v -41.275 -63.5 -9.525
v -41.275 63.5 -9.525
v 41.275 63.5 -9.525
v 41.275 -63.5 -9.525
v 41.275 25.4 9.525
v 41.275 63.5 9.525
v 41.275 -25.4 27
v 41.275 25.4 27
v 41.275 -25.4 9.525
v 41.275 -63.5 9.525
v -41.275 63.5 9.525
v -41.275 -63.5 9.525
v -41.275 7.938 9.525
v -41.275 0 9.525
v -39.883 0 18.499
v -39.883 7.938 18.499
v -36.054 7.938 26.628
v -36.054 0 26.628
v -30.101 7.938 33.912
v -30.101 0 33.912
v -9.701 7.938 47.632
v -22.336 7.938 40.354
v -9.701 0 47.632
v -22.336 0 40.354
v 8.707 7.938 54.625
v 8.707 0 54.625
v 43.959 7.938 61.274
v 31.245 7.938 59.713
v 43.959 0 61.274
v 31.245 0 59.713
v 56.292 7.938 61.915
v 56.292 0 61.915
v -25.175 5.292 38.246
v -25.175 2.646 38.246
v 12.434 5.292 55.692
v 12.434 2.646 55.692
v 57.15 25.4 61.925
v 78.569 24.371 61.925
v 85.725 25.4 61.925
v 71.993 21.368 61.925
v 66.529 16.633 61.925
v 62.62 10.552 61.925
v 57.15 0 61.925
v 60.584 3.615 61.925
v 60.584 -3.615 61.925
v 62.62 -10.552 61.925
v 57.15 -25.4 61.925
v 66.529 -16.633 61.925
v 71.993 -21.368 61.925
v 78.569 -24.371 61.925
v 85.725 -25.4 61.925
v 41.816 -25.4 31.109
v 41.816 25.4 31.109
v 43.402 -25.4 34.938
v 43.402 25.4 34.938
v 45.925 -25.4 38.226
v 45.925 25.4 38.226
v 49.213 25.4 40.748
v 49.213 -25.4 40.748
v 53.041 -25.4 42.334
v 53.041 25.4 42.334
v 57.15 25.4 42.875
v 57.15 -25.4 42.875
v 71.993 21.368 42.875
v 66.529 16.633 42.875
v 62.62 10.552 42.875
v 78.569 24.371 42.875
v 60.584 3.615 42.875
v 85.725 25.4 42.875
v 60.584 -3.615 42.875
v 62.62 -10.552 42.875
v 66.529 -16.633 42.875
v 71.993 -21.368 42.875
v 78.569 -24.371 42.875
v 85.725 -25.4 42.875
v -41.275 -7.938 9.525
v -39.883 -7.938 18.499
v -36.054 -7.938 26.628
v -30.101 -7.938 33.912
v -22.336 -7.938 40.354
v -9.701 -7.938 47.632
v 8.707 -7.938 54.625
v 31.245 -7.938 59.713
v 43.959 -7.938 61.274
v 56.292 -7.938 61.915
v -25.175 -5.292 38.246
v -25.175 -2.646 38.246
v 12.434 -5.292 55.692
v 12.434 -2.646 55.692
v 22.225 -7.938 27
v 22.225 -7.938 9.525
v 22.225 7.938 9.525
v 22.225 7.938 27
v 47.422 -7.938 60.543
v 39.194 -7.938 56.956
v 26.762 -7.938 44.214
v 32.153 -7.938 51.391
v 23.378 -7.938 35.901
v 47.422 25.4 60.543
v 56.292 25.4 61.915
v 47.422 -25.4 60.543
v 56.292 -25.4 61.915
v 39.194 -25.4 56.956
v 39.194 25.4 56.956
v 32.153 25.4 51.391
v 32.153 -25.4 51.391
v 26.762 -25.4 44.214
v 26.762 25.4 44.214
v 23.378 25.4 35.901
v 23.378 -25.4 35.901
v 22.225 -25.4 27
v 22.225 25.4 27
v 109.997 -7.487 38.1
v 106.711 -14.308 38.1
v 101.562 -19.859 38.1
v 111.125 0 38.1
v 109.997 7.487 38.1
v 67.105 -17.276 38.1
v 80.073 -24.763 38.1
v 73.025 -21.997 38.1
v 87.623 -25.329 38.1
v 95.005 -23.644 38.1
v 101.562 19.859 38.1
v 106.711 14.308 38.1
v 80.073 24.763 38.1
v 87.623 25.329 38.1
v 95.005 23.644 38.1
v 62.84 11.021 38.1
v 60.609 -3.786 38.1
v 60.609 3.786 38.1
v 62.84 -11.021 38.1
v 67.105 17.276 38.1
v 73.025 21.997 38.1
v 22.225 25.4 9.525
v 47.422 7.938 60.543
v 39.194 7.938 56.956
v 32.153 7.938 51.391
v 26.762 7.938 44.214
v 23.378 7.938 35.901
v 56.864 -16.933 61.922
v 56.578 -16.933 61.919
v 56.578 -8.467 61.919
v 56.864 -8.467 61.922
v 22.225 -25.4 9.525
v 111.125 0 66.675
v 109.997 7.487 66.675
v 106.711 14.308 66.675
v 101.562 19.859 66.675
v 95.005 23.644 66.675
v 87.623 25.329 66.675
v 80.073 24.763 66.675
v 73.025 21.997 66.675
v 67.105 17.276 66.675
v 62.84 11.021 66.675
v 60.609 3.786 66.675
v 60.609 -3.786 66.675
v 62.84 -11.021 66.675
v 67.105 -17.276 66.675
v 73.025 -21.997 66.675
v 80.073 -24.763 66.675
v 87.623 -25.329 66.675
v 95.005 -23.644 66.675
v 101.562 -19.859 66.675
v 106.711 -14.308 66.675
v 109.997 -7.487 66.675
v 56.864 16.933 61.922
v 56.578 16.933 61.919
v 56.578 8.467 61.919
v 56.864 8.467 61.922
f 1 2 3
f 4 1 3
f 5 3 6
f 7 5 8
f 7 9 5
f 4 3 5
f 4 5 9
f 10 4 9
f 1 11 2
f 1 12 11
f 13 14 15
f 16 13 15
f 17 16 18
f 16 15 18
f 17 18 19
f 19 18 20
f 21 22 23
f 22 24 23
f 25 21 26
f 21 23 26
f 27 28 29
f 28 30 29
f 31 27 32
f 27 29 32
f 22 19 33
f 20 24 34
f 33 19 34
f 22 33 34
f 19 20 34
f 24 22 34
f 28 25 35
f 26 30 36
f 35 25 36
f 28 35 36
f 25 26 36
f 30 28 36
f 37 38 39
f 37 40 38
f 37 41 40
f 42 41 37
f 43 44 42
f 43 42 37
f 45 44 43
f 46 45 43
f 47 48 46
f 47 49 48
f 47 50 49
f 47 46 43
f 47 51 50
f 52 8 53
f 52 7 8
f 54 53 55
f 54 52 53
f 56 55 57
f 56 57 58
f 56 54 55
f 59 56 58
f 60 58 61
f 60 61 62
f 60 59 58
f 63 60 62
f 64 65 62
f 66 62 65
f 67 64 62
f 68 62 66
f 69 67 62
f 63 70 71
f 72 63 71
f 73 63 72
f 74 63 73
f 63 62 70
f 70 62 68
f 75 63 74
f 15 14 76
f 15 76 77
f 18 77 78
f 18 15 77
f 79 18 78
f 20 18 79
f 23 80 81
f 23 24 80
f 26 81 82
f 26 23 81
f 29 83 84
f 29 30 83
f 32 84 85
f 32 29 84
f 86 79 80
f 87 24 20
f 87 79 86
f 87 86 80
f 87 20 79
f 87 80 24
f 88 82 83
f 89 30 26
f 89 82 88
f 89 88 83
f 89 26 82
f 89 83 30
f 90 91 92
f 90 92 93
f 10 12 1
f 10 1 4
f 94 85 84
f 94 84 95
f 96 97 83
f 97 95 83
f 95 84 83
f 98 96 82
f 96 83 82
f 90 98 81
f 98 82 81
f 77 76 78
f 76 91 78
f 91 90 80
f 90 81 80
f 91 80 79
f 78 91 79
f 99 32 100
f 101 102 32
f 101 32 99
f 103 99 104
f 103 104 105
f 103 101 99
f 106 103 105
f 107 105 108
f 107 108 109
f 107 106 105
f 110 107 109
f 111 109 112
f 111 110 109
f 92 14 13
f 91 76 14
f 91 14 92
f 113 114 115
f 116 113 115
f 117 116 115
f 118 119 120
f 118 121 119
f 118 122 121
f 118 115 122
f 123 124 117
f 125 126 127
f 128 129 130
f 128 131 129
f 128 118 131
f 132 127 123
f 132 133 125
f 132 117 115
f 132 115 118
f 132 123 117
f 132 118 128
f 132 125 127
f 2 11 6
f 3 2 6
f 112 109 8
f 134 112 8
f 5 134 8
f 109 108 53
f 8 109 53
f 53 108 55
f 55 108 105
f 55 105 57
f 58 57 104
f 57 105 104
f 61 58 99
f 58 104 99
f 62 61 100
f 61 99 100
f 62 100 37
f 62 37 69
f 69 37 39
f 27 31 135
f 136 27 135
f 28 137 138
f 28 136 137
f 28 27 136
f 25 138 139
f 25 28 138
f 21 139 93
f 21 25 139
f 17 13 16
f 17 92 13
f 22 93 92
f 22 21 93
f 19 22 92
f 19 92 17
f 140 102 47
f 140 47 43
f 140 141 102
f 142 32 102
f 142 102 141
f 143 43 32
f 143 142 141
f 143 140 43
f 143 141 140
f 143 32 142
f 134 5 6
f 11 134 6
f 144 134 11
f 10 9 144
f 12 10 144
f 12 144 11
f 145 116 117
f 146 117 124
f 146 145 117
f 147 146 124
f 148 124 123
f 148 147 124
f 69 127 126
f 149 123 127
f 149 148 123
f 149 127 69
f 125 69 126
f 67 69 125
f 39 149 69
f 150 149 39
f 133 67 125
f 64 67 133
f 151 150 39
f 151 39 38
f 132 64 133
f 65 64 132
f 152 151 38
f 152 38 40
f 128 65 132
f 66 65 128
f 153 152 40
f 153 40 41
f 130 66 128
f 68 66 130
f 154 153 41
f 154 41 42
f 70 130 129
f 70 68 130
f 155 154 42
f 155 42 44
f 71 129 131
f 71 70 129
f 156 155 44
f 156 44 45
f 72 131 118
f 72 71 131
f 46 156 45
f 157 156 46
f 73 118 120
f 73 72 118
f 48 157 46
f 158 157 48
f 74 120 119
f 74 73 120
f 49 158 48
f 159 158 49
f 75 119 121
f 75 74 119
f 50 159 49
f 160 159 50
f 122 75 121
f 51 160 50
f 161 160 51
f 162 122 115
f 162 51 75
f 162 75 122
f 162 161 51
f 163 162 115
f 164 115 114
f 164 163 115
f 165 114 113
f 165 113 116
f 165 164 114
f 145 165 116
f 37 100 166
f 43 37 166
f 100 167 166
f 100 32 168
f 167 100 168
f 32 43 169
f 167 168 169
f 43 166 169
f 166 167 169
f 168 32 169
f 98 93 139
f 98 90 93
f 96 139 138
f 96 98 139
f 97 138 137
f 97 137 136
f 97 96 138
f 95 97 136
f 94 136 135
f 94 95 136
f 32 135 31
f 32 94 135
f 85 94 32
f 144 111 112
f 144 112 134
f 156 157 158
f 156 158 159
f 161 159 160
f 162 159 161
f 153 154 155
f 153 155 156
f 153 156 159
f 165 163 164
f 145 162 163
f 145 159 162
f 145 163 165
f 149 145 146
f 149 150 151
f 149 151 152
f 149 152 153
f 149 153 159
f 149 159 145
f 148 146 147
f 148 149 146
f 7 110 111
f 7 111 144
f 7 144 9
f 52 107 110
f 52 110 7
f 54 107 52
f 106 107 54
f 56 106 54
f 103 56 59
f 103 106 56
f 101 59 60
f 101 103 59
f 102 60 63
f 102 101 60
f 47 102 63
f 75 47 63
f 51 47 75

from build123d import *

# Parameters (mm, degrees)
F1_DEPTH = 63.5
F0_W     = 25.4
F0_H     = 19.05
F2_DEPTH = 25.4
F3_DEPTH = 7.9375


with BuildPart() as f1:
    # F0 (on Front) → F1 (new body, symmetric)
    with BuildSketch(Plane.XZ):
        Polygon((-41.275, 9.525), (-41.275, -9.525), (41.275, -9.525), (41.275, 9.525), (22.225, 9.525), align=None)
    extrude(amount=F1_DEPTH, both=True)

    # F0 (on Front) → F2 (join, symmetric)
    with BuildSketch(Plane.XZ):
        with Locations((73.025, 52.4002)):
            Rectangle(F0_W, F0_H)
        with BuildLine():
            Line((22.225, 9.525), (41.275, 9.525))
            Line((41.275, 9.525), (41.275, 27.0002))
            ThreePointArc((41.275, 27.0002), (45.9246798487, 38.2255201513), (57.15, 42.8752))
            Line((57.15, 42.8752), (60.325, 42.8752))
            Line((60.325, 42.8752), (60.325, 61.9252))
            Line((60.325, 61.9252), (57.15, 61.9252))
            add(Edge.make_bspline(
                [(56.2917515446, 61.9146530902), (56.5784749306, 61.9189535671), (56.8645650873, 61.9224691787), (57.15, 61.9252)],
                knots=[110.7466001681, 110.7466001681, 110.7466001681, 110.7466001681, 111.5045361635, 111.5045361635, 111.5045361635, 111.5045361635], degree=3))
            ThreePointArc((56.2917515446, 61.9146530902), (32.1527006228, 51.3905802522), (22.225, 27.0002))
            Line((22.225, 27.0002), (22.225, 9.525))
        make_face()
    extrude(amount=F2_DEPTH, both=True)

    # F0 (on Front) → F4 (revolve)
    with BuildSketch(Plane.XZ):
        Polygon((85.725, 66.675), (85.725, 61.9252), (85.725, 42.8752), (85.725, 38.1), (111.125, 38.1), (111.125, 66.675), align=None)
    revolve(axis=Axis((85.725, 0, 52.3875), (0, 0, 1)))


with BuildPart() as f3:
    # F0 (on Front) → F3 (new body, symmetric)
    with BuildSketch(Plane.XZ):
        with BuildLine():
            add(Edge.make_bspline(
                [(-41.275, 9.525), (-41.0173954641, 43.90112416), (14.396868092, 61.286284473), (56.2917515446, 61.9146530902)],
                knots=[0, 0, 0, 0, 110.7466001681, 110.7466001681, 110.7466001681, 110.7466001681], degree=3))
            Line((-41.275, 9.525), (22.225, 9.525))
            Line((22.225, 9.525), (22.225, 27.0002))
            ThreePointArc((22.225, 27.0002), (32.1527006228, 51.3905802522), (56.2917515446, 61.9146530902))
        make_face()
    extrude(amount=F3_DEPTH, both=True)


solid = Compound([f1.part, f3.part])
